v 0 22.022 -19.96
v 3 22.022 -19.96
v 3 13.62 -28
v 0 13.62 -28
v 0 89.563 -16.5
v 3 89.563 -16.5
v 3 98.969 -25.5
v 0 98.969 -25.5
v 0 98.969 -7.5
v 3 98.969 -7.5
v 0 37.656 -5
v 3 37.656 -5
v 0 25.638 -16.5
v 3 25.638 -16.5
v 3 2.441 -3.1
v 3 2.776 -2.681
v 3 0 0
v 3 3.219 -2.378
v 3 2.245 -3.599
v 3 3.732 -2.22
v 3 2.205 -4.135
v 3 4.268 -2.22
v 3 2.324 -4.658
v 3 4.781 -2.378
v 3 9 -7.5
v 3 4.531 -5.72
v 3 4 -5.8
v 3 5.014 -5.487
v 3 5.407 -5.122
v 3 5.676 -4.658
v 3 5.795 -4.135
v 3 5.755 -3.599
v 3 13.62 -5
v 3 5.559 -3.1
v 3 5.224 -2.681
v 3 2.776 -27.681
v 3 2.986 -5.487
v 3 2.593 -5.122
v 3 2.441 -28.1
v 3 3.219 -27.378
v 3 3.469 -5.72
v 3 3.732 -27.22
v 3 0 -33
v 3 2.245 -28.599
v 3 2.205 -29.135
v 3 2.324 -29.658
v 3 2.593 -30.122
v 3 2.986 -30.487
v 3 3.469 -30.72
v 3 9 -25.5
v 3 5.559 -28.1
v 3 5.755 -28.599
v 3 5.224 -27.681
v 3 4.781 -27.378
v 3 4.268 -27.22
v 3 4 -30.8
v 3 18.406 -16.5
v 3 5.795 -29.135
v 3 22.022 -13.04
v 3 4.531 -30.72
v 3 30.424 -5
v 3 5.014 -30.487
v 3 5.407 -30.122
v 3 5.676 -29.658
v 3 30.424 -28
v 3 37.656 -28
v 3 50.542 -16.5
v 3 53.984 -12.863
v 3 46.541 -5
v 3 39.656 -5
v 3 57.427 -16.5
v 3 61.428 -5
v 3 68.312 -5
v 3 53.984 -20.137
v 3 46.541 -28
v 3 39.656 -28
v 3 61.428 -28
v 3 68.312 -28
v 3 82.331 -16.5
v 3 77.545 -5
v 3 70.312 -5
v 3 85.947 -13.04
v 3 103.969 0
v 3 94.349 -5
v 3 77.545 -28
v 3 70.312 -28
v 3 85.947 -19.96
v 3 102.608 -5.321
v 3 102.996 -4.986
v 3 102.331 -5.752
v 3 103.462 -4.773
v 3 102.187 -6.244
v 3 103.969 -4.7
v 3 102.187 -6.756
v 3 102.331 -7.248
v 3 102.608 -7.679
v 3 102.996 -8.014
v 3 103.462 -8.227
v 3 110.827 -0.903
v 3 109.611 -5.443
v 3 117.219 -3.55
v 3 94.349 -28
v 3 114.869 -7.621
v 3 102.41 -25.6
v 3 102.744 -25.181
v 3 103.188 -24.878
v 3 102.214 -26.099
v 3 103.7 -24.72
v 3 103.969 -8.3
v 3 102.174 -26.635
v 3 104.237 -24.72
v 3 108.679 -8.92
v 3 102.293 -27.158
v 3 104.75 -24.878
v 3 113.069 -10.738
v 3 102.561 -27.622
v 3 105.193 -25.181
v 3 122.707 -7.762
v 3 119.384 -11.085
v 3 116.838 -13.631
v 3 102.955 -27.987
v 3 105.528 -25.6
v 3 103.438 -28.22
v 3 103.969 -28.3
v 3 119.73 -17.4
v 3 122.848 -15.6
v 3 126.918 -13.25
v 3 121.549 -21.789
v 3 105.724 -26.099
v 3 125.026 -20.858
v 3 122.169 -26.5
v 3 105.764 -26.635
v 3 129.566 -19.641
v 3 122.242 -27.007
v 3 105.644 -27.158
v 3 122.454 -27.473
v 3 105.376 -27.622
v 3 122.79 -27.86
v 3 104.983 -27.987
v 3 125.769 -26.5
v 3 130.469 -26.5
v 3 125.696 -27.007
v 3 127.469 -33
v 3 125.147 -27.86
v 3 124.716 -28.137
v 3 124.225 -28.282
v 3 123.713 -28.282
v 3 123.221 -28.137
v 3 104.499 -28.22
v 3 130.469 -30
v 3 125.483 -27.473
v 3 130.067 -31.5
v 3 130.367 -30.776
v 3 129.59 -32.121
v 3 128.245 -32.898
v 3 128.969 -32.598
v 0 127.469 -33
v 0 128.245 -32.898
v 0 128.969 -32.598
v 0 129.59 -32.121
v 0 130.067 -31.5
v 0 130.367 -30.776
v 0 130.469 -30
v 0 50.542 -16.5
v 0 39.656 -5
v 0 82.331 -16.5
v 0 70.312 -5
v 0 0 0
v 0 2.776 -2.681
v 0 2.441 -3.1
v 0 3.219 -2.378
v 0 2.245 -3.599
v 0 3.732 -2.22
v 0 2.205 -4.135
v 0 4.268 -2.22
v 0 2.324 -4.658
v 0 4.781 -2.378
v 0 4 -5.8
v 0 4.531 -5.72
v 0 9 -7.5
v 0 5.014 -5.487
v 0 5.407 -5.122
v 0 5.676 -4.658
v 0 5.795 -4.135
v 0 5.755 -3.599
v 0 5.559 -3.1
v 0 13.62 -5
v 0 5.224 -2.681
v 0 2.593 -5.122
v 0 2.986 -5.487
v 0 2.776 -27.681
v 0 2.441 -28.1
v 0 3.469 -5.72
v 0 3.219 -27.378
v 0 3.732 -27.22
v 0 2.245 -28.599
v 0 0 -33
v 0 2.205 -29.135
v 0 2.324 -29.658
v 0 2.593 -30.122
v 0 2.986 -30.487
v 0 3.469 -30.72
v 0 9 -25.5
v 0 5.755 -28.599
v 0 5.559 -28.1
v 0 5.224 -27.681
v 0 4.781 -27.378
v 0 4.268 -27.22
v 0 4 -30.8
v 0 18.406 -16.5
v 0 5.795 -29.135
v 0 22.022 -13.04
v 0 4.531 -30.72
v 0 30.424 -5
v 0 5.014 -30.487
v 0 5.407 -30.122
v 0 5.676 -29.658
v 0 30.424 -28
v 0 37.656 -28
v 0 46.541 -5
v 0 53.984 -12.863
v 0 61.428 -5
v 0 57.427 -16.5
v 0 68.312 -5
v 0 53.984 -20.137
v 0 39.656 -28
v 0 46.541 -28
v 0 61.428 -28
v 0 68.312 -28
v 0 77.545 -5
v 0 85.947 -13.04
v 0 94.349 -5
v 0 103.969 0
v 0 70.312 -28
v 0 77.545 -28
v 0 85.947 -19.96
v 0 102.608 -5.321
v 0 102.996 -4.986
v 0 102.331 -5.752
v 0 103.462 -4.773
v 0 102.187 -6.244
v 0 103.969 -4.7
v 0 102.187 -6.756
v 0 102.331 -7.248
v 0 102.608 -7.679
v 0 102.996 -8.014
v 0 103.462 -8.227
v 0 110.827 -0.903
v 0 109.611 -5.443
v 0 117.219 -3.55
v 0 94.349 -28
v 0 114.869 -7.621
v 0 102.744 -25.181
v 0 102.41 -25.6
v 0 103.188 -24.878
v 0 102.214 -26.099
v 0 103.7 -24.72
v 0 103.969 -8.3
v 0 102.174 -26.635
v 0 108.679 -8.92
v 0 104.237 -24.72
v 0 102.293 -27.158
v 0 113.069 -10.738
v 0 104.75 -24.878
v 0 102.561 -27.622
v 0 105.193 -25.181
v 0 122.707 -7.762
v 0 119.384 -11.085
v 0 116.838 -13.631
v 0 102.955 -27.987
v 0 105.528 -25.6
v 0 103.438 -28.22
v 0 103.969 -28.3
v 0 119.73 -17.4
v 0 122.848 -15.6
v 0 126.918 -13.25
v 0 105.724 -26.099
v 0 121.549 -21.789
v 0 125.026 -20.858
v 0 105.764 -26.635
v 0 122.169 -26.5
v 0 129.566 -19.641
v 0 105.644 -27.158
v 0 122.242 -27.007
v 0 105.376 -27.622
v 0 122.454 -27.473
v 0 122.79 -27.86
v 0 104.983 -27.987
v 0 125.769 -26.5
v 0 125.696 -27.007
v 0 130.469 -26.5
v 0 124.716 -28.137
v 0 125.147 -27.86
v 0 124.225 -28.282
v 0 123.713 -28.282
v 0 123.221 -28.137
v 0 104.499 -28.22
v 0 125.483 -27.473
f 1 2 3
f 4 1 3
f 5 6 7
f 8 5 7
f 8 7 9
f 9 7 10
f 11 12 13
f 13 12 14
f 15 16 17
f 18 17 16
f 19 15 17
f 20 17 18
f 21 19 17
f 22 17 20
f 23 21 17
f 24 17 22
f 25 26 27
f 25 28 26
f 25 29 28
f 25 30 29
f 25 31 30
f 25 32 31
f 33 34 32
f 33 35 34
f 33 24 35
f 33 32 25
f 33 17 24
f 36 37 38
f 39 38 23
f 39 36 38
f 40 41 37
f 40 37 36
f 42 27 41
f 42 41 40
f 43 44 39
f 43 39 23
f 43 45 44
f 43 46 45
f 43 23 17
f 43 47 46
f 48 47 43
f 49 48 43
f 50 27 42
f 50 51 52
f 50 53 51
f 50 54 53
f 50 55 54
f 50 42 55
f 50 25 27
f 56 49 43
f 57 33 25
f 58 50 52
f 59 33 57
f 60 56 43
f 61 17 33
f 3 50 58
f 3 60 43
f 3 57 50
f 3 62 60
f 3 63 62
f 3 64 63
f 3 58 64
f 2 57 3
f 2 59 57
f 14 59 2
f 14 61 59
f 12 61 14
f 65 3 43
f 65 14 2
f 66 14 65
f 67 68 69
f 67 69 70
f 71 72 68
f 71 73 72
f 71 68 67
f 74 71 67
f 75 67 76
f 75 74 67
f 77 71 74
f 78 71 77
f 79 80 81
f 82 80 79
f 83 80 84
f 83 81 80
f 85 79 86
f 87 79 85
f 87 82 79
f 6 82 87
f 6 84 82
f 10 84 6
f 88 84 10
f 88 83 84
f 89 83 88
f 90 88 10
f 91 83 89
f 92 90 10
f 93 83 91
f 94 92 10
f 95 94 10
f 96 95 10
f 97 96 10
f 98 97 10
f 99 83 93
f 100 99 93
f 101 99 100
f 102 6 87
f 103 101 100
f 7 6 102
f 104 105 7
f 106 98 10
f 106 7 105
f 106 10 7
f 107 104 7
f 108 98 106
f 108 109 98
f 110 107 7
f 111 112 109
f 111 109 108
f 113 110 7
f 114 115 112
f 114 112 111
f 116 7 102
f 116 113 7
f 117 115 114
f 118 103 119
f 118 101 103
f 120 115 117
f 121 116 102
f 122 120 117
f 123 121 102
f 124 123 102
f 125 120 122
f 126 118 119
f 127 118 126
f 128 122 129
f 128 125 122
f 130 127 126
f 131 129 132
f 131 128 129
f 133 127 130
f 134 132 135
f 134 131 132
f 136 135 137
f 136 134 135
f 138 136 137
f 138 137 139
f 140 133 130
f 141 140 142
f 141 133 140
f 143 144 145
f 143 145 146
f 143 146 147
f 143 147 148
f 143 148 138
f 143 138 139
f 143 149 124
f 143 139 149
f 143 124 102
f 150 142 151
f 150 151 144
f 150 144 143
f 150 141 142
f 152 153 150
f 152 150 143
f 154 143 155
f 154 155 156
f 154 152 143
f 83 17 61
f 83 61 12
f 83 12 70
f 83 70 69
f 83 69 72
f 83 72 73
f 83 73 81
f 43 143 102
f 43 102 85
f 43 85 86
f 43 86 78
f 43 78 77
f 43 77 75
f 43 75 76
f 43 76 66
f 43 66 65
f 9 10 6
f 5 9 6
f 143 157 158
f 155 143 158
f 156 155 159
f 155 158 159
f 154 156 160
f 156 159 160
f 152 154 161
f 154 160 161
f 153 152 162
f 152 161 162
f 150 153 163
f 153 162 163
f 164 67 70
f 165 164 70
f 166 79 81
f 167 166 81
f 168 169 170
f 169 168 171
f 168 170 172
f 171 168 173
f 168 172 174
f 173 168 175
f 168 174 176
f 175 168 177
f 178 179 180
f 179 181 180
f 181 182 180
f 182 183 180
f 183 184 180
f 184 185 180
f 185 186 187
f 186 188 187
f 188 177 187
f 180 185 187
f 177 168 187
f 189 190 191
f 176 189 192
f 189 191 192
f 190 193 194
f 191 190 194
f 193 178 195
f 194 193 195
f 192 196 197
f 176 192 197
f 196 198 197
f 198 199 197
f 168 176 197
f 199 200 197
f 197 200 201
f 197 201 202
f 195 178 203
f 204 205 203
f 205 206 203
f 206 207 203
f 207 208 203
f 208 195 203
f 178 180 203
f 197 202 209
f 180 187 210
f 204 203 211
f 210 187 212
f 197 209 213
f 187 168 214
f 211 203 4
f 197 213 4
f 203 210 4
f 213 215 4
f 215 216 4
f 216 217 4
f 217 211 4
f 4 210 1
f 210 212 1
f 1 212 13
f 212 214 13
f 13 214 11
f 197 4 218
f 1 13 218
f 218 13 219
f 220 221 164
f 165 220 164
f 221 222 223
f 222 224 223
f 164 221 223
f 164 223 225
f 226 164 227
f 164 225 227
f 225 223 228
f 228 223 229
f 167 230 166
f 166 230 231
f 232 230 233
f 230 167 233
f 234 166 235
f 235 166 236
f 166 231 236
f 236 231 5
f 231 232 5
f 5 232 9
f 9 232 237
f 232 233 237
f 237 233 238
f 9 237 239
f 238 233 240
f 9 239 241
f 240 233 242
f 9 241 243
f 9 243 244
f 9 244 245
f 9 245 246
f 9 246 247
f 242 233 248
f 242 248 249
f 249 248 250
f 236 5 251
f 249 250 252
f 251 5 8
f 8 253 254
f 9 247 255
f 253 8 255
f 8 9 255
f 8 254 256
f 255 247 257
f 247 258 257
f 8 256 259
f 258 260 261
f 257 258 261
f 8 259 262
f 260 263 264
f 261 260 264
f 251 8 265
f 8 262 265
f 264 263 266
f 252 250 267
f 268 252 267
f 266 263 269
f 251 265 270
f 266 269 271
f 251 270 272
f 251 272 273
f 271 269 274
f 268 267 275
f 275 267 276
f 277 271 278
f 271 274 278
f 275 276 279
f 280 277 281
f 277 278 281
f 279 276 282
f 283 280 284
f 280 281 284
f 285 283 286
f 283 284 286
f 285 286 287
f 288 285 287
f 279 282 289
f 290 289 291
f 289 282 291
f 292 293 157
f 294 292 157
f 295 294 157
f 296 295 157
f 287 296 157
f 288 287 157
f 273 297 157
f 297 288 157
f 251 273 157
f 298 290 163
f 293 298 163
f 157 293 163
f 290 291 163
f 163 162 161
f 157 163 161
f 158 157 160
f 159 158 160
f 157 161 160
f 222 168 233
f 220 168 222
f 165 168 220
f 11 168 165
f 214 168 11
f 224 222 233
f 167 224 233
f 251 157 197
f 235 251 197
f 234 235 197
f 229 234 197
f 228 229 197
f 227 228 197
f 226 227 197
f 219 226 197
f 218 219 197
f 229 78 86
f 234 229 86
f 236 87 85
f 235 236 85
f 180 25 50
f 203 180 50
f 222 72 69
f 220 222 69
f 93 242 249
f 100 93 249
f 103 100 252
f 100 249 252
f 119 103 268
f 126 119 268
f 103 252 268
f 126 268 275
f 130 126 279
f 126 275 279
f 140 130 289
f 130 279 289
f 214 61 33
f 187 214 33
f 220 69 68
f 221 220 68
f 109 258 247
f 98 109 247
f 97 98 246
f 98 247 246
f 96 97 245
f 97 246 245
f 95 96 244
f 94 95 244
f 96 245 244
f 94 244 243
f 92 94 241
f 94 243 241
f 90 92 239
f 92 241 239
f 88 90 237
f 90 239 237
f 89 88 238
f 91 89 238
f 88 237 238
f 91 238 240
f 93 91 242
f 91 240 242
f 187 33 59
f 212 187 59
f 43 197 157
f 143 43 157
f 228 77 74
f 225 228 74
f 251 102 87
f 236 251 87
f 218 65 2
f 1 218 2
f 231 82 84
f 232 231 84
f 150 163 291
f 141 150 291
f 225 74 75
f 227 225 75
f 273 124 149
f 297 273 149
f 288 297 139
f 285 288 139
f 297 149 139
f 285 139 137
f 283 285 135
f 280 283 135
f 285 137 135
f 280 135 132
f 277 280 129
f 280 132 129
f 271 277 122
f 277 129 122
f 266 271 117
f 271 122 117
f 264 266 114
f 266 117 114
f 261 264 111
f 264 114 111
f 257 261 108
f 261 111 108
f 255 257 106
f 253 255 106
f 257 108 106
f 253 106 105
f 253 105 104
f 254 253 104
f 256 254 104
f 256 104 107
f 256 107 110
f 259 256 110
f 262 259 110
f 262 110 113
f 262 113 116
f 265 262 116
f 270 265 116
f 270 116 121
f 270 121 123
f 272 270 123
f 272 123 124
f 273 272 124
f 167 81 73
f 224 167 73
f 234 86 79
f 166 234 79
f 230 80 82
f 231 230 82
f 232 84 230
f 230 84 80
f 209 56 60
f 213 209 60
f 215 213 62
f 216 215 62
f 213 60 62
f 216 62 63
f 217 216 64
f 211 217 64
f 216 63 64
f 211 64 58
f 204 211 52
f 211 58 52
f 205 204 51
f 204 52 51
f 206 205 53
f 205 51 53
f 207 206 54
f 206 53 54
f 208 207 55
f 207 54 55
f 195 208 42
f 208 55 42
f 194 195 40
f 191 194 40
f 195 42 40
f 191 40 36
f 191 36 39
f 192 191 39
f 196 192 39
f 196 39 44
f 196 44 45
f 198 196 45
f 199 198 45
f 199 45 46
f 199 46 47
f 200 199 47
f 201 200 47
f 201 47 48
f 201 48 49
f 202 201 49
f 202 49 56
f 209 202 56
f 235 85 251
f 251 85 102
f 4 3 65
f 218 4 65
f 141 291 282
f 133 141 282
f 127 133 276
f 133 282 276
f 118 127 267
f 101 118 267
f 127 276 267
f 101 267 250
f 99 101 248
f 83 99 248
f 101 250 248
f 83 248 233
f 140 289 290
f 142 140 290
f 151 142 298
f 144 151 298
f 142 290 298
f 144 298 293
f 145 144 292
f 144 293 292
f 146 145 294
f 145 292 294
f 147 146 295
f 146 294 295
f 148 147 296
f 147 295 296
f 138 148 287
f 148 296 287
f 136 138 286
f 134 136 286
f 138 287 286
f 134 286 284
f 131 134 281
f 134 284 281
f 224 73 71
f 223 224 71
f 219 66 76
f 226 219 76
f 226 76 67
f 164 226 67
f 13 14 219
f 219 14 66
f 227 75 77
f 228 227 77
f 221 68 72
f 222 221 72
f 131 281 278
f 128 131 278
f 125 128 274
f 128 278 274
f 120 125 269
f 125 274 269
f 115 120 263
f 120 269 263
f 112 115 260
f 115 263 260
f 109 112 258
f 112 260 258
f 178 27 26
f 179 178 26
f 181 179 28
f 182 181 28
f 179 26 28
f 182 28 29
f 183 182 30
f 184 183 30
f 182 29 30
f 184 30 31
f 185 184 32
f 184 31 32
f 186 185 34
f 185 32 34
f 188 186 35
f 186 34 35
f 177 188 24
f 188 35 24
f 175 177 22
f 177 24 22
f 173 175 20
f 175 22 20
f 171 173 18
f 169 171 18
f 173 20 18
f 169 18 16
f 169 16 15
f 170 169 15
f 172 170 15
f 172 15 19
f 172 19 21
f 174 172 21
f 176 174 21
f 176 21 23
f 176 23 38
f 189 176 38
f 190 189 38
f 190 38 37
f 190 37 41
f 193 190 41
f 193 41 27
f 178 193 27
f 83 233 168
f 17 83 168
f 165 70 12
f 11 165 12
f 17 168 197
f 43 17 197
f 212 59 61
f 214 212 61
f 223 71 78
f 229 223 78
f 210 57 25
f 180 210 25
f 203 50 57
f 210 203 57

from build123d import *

# Parameters (mm, degrees)
SKETCH1_R            = 1.5
BOSS_EXTRUDE1_DEPTH  = 3
M3_CLEARANCE_HOLE1_D = 3.6
CUT_EXTRUDE1_DEPTH   = 10


with BuildPart() as part:
    # Sketch1 → Boss-Extrude1 (new body)
    with BuildSketch(Plane(origin=(0, 0, 0), x_dir=(0, 0, -1), z_dir=(1, 0, 0))):
        with BuildLine():
            Line((33, 103.968745116), (33, 127.468745116))
            ThreePointArc((33, 127.468745116), (32.121320344, 129.590065459), (30, 130.468745116))
            Line((30, 130.468745116), (26.5, 130.468745116))
            ThreePointArc((26.5, 130.468745116), (7.761670299, 122.707074817), (0, 103.968745116))
            Line((0, 103.968745116), (0, 0))
            Line((0, 0), (33, 0))
            Line((33, 0), (33, 103.968745116))
        make_face()
        with Locations((4, 4)):
            Circle(SKETCH1_R, mode=Mode.SUBTRACT)
        with Locations((29, 4)):
            Circle(SKETCH1_R, mode=Mode.SUBTRACT)
        with Locations((26.5, 103.968745116)):
            Circle(SKETCH1_R, mode=Mode.SUBTRACT)
        with BuildLine():
            ThreePointArc((4.7, 103.968745116), (11.08507217, 119.383672946), (26.5, 125.768745116))
            ThreePointArc((26.5, 125.768745116), (28.3, 123.968745116), (26.5, 122.168745116))
            ThreePointArc((26.5, 122.168745116), (13.630656582, 116.838088533), (8.3, 103.968745116))
            ThreePointArc((8.3, 103.968745116), (6.5, 102.168745116), (4.7, 103.968745116))
        make_face(mode=Mode.SUBTRACT)
    extrude(amount=BOSS_EXTRUDE1_DEPTH)

    # M3 Clearance Hole1 (through all)
    with Locations(Plane.ZY):
        with Locations((-29, 4), (-4, 4), (-26.5, 103.968745116)):
            Hole(M3_CLEARANCE_HOLE1_D / 2)

    # Sketch4 → Cut-Extrude1 (cut)
    with BuildSketch(Plane(origin=(3, 0, 0), x_dir=(0, 0, -1), z_dir=(1, 0, 0))):
        Polygon((5, 13.619501596), (13.039872779, 22.021779252), (5, 30.424056909), align=None)
        Polygon((7.5, 9), (25.5, 9), (16.5, 18.405683521), align=None)
        Polygon((28, 30.424056909), (19.960127221, 22.021779252), (28, 13.619501596), align=None)
        Polygon((5, 37.656248372), (16.5, 25.637874984), (28, 37.656248372), (28, 39.656248372), (16.5, 50.541969576), (5, 39.656248372), align=None)
        Polygon((20.136657006, 53.984372558), (28, 46.541054335), (28, 61.427690781), align=None)
        Polygon((5, 61.427690781), (5, 46.541054335), (12.863342994, 53.984372558), align=None)
        Polygon((5, 70.312496744), (5, 68.312496744), (16.5, 57.426775539), (28, 68.312496744), (28, 70.312496744), (16.5, 82.330870131), align=None)
        Polygon((19.960127221, 85.946965863), (28, 77.544688207), (28, 94.349243519), align=None)
        Polygon((5, 94.349243519), (5, 77.544688207), (13.039872779, 85.946965863), align=None)
        Polygon((7.5, 98.968745116), (16.5, 89.563061595), (25.5, 98.968745116), align=None)
    extrude(amount=-CUT_EXTRUDE1_DEPTH, mode=Mode.SUBTRACT)


solid = part.part
